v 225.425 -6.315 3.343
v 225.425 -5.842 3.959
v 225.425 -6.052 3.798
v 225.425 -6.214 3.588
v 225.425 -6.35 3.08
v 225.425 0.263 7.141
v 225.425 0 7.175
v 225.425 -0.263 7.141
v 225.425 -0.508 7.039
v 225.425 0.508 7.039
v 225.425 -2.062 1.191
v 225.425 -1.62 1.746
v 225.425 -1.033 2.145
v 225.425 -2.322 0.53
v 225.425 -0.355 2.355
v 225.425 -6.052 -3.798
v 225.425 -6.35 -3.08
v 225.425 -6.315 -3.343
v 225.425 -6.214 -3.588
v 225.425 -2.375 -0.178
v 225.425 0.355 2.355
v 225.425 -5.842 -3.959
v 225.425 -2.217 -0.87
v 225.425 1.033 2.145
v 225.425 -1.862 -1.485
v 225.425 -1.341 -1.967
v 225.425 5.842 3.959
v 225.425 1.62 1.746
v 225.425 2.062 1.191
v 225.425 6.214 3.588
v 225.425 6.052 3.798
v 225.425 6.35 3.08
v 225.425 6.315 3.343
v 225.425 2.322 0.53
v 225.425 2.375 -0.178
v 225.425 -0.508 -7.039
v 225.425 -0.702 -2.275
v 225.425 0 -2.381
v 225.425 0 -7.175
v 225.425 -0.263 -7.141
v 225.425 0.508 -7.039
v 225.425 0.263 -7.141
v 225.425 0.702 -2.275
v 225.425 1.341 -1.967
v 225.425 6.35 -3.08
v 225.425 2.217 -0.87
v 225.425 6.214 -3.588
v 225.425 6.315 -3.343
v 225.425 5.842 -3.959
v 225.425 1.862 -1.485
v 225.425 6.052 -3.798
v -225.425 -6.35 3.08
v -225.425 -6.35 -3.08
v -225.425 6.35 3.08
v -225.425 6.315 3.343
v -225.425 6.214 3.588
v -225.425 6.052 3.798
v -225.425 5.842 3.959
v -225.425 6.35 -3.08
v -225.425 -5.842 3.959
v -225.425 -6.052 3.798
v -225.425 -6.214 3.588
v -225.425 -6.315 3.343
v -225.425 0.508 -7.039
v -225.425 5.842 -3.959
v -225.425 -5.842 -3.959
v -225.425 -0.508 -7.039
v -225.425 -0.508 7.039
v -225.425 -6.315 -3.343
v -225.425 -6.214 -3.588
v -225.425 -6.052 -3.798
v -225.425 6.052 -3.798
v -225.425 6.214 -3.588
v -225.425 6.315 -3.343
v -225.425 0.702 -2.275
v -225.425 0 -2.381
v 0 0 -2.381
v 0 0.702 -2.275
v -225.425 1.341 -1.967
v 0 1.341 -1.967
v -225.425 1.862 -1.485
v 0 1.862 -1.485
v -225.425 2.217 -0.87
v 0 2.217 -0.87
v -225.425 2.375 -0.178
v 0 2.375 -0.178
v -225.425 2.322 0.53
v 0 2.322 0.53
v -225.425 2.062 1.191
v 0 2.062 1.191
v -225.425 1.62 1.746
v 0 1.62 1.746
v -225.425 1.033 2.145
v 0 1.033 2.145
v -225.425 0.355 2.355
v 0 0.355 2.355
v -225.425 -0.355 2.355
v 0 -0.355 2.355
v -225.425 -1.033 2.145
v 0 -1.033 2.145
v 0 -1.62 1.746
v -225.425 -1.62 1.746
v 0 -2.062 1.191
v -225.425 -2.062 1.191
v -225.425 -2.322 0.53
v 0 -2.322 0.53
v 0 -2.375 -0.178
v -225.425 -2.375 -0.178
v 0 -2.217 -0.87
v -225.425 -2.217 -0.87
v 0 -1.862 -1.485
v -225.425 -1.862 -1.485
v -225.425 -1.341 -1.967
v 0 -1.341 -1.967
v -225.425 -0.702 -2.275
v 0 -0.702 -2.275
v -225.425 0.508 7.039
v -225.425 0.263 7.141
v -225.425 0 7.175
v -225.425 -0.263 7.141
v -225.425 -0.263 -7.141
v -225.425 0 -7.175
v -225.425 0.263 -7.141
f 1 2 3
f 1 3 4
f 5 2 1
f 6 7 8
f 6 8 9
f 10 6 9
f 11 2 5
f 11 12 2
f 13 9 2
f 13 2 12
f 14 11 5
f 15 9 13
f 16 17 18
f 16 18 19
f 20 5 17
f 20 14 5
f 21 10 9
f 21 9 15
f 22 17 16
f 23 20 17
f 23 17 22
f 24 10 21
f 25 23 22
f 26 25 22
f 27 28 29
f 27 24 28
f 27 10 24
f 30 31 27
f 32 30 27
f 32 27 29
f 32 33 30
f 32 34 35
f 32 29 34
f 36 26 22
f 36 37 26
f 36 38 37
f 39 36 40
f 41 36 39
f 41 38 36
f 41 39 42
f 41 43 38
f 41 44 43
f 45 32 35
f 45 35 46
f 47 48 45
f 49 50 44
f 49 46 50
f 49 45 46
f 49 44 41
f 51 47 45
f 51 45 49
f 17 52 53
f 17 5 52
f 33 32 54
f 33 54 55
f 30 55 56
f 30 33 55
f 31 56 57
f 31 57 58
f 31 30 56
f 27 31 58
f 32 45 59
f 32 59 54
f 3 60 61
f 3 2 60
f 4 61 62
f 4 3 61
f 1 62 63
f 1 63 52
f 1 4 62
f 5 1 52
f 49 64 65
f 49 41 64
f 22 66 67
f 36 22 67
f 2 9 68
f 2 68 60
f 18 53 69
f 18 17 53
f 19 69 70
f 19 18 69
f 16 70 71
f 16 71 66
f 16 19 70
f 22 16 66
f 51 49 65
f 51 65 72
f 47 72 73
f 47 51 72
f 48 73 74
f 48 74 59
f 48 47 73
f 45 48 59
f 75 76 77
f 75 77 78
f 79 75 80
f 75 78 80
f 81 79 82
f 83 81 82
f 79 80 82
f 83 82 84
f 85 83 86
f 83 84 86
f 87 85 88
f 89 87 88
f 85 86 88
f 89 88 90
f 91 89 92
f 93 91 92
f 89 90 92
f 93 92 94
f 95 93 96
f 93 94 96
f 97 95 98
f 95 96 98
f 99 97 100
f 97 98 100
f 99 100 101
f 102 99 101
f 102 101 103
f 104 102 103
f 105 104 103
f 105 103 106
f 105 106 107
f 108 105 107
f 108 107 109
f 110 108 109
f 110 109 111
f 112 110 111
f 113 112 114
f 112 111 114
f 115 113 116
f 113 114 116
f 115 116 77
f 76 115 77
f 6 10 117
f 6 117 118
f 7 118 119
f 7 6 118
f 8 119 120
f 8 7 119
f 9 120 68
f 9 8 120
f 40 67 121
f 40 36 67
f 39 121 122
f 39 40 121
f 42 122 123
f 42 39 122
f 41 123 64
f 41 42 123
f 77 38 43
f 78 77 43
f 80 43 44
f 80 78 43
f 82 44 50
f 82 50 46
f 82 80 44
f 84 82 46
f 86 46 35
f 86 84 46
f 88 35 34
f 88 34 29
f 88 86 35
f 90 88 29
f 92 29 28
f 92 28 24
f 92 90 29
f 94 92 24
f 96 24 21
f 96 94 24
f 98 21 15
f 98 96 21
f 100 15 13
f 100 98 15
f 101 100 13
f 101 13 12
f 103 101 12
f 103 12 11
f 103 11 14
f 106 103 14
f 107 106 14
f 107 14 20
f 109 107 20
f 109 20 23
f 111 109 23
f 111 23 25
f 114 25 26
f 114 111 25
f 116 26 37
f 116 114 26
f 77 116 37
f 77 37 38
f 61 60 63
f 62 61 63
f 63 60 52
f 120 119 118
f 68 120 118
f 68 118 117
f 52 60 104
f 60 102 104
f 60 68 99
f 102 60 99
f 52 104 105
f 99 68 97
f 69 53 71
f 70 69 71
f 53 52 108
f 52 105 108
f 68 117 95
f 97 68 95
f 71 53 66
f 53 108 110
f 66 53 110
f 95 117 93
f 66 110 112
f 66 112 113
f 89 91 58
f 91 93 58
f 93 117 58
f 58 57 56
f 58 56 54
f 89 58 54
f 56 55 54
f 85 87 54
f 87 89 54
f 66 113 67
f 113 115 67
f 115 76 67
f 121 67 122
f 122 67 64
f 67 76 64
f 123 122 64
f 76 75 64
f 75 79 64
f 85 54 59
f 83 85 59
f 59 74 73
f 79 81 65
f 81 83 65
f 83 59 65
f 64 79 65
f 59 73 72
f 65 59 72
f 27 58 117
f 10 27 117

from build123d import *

# Parameters (mm, degrees)
SKETCH1_R                = 2.38125
BOSS_EXTRUDE1_DEPTH      = 225.425
BOSS_EXTRUDE1_DEPTH_BACK = 225.425


with BuildPart() as part:
    # Sketch1 → Boss-Extrude1 (new body, two sides)
    with BuildSketch(Plane(origin=(0, 0, 0), x_dir=(0, 0, -1), z_dir=(1, 0, 0))) as boss_extrude1_sk:
        with BuildLine():
            Line((7.039054482, 0.508), (3.959468146, 5.842))
            ThreePointArc((3.959468146, 5.842), (3.587586336, 6.21388181), (3.079586336, 6.35))
            Line((3.079586336, 6.35), (-3.079586336, 6.35))
            ThreePointArc((-3.079586336, 6.35), (-3.587586336, 6.21388181), (-3.959468146, 5.842))
            Line((-3.959468146, 5.842), (-7.039054482, 0.508))
            ThreePointArc((-7.039054482, 0.508), (-7.175172672, 0), (-7.039054482, -0.508))
            Line((-7.039054482, -0.508), (-3.959468146, -5.842))
            ThreePointArc((-3.959468146, -5.842), (-3.587586336, -6.21388181), (-3.079586336, -6.35))
            Line((-3.079586336, -6.35), (3.079586336, -6.35))
            ThreePointArc((3.079586336, -6.35), (3.587586336, -6.21388181), (3.959468146, -5.842))
            Line((3.959468146, -5.842), (7.039054482, -0.508))
            ThreePointArc((7.039054482, -0.508), (7.175172672, 0), (7.039054482, 0.508))
        make_face()
        Circle(SKETCH1_R, mode=Mode.SUBTRACT)
    extrude(amount=BOSS_EXTRUDE1_DEPTH)
    extrude(boss_extrude1_sk.sketch, amount=-BOSS_EXTRUDE1_DEPTH_BACK)


solid = part.part
